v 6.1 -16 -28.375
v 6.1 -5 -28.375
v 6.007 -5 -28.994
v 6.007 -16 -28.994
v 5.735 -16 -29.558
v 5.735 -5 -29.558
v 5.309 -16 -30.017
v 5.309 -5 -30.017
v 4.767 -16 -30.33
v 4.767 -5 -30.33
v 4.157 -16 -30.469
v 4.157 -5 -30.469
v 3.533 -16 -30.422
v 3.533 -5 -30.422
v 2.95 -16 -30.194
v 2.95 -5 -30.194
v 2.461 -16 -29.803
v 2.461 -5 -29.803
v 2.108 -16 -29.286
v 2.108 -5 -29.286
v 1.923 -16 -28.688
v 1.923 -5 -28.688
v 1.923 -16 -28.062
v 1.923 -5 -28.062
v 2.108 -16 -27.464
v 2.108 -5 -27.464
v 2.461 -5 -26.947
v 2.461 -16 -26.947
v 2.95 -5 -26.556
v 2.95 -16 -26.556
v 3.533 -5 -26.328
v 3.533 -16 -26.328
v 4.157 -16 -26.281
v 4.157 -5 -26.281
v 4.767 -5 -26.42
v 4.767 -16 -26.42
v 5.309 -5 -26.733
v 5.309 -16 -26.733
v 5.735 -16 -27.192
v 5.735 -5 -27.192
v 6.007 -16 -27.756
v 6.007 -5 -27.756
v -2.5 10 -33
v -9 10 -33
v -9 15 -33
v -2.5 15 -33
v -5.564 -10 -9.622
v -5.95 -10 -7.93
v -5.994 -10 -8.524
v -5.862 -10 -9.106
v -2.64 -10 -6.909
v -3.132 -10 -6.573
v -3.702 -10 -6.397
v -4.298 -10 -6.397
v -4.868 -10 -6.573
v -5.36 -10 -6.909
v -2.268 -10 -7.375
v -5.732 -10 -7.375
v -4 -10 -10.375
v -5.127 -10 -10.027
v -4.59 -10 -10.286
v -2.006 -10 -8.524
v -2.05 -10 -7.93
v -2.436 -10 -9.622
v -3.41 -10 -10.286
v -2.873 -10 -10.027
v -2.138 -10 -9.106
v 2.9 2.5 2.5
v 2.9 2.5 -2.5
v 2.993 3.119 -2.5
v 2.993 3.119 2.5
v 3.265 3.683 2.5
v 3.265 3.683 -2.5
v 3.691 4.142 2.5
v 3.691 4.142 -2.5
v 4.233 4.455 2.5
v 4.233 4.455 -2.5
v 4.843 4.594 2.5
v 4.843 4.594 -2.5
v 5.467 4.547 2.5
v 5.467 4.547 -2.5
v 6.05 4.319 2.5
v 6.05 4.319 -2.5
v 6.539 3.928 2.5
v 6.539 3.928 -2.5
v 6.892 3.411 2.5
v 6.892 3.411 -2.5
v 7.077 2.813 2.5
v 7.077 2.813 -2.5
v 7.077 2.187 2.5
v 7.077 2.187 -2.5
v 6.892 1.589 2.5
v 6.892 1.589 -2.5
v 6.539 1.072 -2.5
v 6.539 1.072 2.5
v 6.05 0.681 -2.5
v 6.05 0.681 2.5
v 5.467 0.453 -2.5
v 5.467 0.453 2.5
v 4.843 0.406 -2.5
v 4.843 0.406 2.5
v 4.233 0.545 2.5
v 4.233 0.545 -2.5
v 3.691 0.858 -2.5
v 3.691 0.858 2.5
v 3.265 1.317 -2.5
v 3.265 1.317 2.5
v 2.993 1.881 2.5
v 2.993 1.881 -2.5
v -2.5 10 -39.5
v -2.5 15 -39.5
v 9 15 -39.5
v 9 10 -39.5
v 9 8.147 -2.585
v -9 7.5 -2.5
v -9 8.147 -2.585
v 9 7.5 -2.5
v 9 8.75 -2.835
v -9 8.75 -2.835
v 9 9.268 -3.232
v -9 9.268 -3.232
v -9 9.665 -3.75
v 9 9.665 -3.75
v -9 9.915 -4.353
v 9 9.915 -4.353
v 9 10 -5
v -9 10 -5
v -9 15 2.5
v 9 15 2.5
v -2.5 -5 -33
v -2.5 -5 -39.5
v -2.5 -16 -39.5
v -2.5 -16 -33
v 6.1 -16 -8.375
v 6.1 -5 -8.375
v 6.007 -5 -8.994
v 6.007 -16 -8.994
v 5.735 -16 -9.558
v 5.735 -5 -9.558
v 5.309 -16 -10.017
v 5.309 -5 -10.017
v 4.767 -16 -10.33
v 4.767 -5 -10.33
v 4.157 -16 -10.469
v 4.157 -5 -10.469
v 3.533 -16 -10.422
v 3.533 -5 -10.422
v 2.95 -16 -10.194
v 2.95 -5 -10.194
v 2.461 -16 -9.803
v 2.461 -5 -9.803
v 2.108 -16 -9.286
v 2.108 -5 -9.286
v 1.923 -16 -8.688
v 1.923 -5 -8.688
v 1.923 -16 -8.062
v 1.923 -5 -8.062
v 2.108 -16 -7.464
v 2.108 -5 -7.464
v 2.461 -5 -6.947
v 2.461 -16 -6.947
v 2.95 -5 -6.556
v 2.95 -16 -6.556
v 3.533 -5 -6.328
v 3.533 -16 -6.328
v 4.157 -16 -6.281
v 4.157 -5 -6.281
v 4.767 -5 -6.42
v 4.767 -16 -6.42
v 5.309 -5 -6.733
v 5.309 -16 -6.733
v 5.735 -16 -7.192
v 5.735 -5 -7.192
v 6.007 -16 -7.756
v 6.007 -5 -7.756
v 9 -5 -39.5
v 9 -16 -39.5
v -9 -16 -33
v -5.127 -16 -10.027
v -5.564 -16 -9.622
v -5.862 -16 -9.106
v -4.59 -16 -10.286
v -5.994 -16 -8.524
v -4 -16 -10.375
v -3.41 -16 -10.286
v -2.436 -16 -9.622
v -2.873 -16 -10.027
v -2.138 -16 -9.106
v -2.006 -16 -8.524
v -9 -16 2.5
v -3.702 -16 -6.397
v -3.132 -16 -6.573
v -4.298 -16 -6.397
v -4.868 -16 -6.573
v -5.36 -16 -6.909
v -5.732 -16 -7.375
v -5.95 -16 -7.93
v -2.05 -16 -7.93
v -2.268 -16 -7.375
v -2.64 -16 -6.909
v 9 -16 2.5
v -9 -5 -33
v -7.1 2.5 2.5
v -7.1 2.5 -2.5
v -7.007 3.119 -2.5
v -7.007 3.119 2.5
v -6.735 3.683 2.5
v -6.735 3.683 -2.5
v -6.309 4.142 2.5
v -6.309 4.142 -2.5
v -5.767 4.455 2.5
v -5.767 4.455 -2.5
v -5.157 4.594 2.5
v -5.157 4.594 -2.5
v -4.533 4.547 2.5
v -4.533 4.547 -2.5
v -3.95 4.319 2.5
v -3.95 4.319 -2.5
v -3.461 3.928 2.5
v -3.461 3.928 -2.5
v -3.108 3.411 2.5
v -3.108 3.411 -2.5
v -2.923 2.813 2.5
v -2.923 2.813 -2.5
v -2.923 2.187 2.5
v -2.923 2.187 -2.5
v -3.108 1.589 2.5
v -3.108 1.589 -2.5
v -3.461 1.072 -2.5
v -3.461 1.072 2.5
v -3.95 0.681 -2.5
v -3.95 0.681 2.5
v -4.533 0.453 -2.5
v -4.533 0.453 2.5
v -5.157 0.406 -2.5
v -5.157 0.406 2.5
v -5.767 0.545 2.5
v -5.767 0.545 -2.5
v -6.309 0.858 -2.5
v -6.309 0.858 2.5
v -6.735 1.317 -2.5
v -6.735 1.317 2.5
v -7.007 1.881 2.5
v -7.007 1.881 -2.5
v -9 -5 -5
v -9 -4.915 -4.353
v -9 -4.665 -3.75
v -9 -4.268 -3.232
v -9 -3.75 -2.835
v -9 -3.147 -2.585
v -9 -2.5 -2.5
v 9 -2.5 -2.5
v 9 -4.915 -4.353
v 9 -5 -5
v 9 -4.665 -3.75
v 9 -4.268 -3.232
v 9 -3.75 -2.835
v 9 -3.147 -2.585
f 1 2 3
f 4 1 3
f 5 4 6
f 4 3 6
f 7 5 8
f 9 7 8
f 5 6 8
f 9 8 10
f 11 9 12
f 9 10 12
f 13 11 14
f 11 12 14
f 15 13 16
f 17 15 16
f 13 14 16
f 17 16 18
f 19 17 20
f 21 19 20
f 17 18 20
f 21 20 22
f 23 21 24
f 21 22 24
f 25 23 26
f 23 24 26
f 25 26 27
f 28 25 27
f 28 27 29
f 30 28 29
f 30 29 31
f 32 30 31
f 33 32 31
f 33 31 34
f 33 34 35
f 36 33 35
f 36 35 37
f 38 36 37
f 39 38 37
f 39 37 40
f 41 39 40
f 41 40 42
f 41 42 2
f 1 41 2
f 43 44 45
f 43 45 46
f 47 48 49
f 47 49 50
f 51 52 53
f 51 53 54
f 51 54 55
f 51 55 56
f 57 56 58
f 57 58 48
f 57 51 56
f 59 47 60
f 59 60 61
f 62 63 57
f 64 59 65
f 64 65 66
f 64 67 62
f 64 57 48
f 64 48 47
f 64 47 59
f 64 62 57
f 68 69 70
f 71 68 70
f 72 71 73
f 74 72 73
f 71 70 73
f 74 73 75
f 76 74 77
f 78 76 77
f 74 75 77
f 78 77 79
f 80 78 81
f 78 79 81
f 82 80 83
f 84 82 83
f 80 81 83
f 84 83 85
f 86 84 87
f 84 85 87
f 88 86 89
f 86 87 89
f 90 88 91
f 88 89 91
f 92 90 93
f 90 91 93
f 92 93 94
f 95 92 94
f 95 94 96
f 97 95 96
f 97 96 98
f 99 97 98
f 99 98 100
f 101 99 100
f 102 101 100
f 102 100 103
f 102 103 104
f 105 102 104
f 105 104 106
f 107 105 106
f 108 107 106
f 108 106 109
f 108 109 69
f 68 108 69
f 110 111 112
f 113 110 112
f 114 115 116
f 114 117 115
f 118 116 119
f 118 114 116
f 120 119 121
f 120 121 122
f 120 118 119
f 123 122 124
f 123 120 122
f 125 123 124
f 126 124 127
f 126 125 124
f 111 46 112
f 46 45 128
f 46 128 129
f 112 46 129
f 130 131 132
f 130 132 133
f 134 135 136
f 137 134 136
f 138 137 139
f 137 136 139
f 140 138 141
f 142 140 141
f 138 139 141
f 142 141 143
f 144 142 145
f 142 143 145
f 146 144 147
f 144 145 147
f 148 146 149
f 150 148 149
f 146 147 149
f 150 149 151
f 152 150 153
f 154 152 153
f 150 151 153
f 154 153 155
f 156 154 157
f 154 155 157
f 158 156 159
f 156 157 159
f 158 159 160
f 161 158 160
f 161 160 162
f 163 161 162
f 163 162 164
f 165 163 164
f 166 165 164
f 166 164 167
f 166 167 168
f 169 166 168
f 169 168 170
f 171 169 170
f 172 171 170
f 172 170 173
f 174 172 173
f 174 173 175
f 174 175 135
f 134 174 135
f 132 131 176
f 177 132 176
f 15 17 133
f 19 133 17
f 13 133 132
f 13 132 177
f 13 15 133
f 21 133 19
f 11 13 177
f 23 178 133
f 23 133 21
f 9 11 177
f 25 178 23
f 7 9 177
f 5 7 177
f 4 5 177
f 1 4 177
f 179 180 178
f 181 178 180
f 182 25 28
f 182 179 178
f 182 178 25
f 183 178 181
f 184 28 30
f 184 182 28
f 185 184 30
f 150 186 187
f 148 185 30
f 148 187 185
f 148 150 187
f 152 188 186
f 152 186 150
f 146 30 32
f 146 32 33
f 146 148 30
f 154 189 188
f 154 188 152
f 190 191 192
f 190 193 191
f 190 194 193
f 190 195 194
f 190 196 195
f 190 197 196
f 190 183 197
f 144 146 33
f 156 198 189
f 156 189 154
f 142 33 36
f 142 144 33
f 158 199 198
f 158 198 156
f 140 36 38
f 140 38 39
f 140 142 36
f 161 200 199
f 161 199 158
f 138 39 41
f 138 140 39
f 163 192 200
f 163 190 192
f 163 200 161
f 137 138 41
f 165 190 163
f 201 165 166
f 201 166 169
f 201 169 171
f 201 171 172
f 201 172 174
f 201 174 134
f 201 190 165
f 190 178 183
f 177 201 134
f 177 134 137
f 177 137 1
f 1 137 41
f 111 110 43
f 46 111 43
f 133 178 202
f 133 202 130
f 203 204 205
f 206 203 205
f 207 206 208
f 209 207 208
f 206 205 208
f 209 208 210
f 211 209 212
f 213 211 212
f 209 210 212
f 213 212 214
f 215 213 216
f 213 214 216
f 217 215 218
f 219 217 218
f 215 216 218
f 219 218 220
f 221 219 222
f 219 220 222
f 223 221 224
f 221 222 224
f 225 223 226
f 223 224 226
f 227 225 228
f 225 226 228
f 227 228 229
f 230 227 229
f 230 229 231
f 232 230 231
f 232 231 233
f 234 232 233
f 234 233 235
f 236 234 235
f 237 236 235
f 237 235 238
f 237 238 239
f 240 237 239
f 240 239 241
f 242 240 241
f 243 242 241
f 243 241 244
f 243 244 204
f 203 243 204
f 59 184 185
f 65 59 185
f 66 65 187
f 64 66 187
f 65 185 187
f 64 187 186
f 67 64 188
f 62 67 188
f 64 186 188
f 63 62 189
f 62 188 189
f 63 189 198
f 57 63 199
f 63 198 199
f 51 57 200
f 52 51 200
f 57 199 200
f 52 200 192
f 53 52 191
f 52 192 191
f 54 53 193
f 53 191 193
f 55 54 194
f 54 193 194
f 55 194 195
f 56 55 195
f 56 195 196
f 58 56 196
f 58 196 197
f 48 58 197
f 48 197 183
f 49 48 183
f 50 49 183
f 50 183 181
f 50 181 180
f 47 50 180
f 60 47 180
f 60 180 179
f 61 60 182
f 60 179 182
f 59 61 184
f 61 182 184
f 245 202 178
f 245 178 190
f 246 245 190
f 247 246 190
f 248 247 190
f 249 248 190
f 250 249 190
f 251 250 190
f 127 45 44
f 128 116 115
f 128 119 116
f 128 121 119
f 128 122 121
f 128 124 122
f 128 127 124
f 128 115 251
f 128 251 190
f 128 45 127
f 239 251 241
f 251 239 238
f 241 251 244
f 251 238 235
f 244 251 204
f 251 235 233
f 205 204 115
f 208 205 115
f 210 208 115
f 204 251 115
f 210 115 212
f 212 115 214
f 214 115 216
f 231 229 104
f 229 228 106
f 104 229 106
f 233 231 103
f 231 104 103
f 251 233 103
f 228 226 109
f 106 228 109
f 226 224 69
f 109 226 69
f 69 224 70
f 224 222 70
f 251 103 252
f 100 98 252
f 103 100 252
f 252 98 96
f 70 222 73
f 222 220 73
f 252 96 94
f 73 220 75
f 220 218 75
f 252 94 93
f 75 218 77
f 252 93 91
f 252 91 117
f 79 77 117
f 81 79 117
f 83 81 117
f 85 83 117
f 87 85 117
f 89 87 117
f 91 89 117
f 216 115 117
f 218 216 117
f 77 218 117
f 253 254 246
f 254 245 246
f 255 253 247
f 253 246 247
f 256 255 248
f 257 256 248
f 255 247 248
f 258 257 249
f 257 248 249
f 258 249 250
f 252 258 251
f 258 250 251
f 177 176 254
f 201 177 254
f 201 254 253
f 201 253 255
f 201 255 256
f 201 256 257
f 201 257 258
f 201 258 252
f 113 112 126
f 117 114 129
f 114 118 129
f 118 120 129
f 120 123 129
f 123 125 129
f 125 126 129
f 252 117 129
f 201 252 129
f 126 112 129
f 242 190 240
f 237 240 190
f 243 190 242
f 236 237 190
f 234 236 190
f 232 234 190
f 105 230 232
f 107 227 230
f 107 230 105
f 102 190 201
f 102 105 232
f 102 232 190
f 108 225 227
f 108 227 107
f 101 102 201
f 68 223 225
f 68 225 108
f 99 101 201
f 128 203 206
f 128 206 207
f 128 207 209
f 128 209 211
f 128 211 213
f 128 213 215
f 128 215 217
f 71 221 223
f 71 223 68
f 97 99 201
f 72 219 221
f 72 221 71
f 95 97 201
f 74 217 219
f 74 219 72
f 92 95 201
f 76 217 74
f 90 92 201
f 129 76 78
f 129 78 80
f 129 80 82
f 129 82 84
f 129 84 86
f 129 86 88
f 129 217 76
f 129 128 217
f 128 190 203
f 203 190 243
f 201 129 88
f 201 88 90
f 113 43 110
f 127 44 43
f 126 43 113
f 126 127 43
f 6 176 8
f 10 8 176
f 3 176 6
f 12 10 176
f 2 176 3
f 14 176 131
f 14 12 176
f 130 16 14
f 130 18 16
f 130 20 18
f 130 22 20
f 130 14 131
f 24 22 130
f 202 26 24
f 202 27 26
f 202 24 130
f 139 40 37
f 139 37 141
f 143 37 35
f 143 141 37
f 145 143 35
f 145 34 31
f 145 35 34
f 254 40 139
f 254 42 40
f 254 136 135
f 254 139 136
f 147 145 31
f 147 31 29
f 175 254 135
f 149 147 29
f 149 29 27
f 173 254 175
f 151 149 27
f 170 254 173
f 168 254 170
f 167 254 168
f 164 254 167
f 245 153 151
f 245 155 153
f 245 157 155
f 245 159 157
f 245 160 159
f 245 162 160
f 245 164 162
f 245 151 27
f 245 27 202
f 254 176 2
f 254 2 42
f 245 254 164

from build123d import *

# Parameters (mm, degrees)
SKETCH1_W                                  = 18
SKETCH1_H                                  = 20
BOSS_EXTRUDE1_DEPTH                        = 2.5
SKETCH2_W                                  = 18
SKETCH2_H                                  = 5
BOSS_EXTRUDE2_DEPTH                        = 42
SKETCH7_W                                  = 18
SKETCH7_H                                  = 5
BOSS_EXTRUDE3_DEPTH                        = 42
CSK_FOR_M3_HEX_SOCKET_COUNTERSUNK_CAP_SC_D = 4.2
SKETCH10_W                                 = 18
SKETCH10_H                                 = 42
BOSS_EXTRUDE4_DEPTH                        = 6
SKETCH9_W                                  = 6.5
SKETCH9_H                                  = 6.5
CUT_EXTRUDE2_DEPTH                         = 52.01225343
TAPPED_HOLE_FOR_M4X0_7_HELICOIL1_D         = 4.2
TAPPED_HOLE_FOR_M4X0_7_HELICOIL1_DEPTH     = 11
SKETCH11_R                                 = 2
CUT_EXTRUDE3_DEPTH                         = 6
FILLET1_R                                  = 2.5


with BuildPart() as part:
    # Sketch1 → Boss-Extrude1 (new, symmetric)
    with BuildSketch(Plane.XY):
        Rectangle(SKETCH1_W, SKETCH1_H)
    extrude(amount=BOSS_EXTRUDE1_DEPTH, both=True)

    # Sketch2 → Boss-Extrude2 (add)
    with BuildSketch(Plane(origin=(0, 0, 2.5), x_dir=(-1, 0, 0), z_dir=(0, 0, -1))):
        with Locations((0, -7.5)):
            Rectangle(SKETCH2_W, SKETCH2_H)
    extrude(amount=BOSS_EXTRUDE2_DEPTH)

    # Sketch7 → Boss-Extrude3 (add)
    with BuildSketch(Plane.XY.offset(2.5)):
        with Locations((0, 12.5)):
            Rectangle(SKETCH7_W, SKETCH7_H)
    extrude(amount=-BOSS_EXTRUDE3_DEPTH)

    # CSK for M3 Hex Socket Countersunk Cap Screw1 (through all)
    with Locations(Plane.XY.offset(2.5)):
        with Locations((-5, 2.5), (5, 2.5)):
            Hole(CSK_FOR_M3_HEX_SOCKET_COUNTERSUNK_CAP_SC_D / 2)

    # Sketch10 → Boss-Extrude4 (add)
    with BuildSketch(Plane.XZ.offset(10)):
        with Locations((0, -18.5)):
            Rectangle(SKETCH10_W, SKETCH10_H)
    extrude(amount=BOSS_EXTRUDE4_DEPTH)

    # Sketch9 → Cut-Extrude2 (cut, through all)
    with BuildSketch(Plane.XZ.offset(16)):
        with Locations((-5.75, -36.25)):
            Rectangle(SKETCH9_W, SKETCH9_H)
    extrude(amount=-CUT_EXTRUDE2_DEPTH, mode=Mode.SUBTRACT)

    # Tapped Hole for M4x0.7 Helicoil1
    with Locations(Plane(origin=(0, -16, 0), x_dir=(-1, 0, 0), z_dir=(0, -1, 0))):
        with Locations((-4, 28.375), (-4, 8.375)):
            Hole(TAPPED_HOLE_FOR_M4X0_7_HELICOIL1_D / 2, depth=TAPPED_HOLE_FOR_M4X0_7_HELICOIL1_DEPTH)

    # Sketch11 → Cut-Extrude3 (cut)
    with BuildSketch(Plane(origin=(0, -16, 0), x_dir=(-1, 0, 0), z_dir=(0, -1, 0))):
        with Locations(Location((4, 8.375, 0), (0, 0, 90))):
            Circle(SKETCH11_R)
    extrude(amount=-CUT_EXTRUDE3_DEPTH, mode=Mode.SUBTRACT)

    # Fillet1
    fillet1_edges = [part.edges().sort_by_distance(p)[0] for p in [
        (0, -5, -2.5),
        (0, 10, -2.5),
    ]]
    fillet(fillet1_edges, radius=FILLET1_R)


solid = part.part
